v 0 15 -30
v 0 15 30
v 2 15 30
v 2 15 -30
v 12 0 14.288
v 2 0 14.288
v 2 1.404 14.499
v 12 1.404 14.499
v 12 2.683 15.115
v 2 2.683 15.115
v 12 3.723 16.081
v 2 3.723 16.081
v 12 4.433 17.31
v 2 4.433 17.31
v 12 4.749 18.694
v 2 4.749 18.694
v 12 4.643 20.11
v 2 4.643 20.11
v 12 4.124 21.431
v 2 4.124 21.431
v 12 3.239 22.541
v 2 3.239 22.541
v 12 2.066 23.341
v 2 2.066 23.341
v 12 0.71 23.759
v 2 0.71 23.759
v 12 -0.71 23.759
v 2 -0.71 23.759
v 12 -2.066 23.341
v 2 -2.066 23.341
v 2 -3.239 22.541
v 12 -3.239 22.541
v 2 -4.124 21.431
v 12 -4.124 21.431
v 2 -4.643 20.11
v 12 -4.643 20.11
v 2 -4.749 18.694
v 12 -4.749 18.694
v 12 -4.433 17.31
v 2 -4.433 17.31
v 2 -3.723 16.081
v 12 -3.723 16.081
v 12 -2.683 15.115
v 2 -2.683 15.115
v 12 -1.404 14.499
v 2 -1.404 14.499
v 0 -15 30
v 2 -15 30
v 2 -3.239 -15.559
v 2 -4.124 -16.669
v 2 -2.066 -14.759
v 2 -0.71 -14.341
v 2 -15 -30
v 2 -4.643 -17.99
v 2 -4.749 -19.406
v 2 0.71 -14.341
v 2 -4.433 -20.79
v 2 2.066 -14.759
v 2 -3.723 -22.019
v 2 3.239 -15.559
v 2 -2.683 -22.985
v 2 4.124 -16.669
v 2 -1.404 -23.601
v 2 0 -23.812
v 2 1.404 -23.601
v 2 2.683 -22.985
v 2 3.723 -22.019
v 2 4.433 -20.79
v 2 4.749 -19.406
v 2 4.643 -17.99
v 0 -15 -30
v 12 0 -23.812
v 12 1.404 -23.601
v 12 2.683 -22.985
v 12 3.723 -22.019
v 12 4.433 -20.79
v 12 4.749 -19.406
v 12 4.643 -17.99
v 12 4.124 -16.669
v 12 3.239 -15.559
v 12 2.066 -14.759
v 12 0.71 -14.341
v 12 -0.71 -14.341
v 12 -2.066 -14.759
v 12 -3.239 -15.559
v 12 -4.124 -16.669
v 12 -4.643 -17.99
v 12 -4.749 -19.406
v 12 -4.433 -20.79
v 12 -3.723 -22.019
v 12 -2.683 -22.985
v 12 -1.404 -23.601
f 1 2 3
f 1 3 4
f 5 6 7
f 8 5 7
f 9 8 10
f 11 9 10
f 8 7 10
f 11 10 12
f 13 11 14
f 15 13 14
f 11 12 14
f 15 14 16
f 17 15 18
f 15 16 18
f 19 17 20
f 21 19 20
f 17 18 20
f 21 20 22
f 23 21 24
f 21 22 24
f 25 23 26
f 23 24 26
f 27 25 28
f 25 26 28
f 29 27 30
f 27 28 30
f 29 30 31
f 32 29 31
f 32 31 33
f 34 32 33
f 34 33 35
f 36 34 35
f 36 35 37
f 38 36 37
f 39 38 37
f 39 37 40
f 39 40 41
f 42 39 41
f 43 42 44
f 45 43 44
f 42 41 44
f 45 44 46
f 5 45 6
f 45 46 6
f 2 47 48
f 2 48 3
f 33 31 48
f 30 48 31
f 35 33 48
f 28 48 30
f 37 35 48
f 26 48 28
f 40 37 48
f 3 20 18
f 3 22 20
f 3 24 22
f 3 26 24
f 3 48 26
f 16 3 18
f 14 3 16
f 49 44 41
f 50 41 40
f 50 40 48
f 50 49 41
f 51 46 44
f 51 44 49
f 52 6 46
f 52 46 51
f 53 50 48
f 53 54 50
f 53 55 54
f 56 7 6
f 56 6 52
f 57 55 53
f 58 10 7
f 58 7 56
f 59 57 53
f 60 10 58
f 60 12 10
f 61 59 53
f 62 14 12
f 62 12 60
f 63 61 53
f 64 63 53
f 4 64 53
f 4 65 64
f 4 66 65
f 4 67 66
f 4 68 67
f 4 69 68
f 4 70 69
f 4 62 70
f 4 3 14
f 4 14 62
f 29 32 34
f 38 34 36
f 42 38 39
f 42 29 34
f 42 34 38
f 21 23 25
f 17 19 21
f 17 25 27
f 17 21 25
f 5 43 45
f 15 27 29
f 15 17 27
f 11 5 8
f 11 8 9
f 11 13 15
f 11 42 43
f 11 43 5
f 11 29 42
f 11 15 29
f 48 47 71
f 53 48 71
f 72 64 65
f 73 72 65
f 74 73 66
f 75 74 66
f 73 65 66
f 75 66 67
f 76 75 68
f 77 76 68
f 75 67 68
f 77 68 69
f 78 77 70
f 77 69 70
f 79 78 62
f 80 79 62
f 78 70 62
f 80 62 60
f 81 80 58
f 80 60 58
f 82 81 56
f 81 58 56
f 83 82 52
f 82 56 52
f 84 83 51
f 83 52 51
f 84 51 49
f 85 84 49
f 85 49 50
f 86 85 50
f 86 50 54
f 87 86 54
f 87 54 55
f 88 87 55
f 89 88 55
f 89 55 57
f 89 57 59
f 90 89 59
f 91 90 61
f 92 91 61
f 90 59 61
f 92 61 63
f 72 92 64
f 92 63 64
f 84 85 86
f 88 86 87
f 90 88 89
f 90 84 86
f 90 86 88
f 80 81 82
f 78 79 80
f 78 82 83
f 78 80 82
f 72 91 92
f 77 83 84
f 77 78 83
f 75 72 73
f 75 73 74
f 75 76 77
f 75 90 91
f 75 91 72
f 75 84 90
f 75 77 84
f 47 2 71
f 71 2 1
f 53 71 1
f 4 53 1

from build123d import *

# Parameters (mm, degrees)
SKETCH2_W           = 60
SKETCH2_H           = 30
SKETCH2_R           = 4.7625
BOSS_EXTRUDE1_DEPTH = 2
BOSS_EXTRUDE2_START = 2
SKETCH2_3_R         = 4.7625
BOSS_EXTRUDE2_DEPTH = 10


with BuildPart() as part:
    # Sketch2 → Boss-Extrude1 (new body)
    # profile 1 of 3: a face of its own
    with BuildSketch(Plane(origin=(0, 0, 0), x_dir=(0, 0, -1), z_dir=(1, 0, 0))):
        Rectangle(SKETCH2_W, SKETCH2_H)
        with Locations((19.05, 0)):
            Circle(SKETCH2_R, mode=Mode.SUBTRACT)
        with Locations((-19.05, 0)):
            Circle(SKETCH2_R, mode=Mode.SUBTRACT)
    # profile 2 of 3: a face of its own
    with BuildSketch(Plane(origin=(0, 0, 0), x_dir=(0, 0, -1), z_dir=(1, 0, 0))):
        with Locations((19.05, 0)):
            Circle(SKETCH2_R)
    # profile 3 of 3: a face of its own
    with BuildSketch(Plane(origin=(0, 0, 0), x_dir=(0, 0, -1), z_dir=(1, 0, 0))):
        with Locations((-19.05, 0)):
            Circle(SKETCH2_R)
    extrude(amount=BOSS_EXTRUDE1_DEPTH)

    # Sketch2<3> → Boss-Extrude2 (add)
    with BuildSketch(Plane(origin=(0, 0, 0), x_dir=(0, 0, -1), z_dir=(1, 0, 0)).offset(BOSS_EXTRUDE2_START)):
        with Locations((-19.05, 0)):
            Circle(SKETCH2_3_R)
        with Locations((19.05, 0)):
            Circle(SKETCH2_3_R)
    extrude(amount=BOSS_EXTRUDE2_DEPTH)


solid = part.part
